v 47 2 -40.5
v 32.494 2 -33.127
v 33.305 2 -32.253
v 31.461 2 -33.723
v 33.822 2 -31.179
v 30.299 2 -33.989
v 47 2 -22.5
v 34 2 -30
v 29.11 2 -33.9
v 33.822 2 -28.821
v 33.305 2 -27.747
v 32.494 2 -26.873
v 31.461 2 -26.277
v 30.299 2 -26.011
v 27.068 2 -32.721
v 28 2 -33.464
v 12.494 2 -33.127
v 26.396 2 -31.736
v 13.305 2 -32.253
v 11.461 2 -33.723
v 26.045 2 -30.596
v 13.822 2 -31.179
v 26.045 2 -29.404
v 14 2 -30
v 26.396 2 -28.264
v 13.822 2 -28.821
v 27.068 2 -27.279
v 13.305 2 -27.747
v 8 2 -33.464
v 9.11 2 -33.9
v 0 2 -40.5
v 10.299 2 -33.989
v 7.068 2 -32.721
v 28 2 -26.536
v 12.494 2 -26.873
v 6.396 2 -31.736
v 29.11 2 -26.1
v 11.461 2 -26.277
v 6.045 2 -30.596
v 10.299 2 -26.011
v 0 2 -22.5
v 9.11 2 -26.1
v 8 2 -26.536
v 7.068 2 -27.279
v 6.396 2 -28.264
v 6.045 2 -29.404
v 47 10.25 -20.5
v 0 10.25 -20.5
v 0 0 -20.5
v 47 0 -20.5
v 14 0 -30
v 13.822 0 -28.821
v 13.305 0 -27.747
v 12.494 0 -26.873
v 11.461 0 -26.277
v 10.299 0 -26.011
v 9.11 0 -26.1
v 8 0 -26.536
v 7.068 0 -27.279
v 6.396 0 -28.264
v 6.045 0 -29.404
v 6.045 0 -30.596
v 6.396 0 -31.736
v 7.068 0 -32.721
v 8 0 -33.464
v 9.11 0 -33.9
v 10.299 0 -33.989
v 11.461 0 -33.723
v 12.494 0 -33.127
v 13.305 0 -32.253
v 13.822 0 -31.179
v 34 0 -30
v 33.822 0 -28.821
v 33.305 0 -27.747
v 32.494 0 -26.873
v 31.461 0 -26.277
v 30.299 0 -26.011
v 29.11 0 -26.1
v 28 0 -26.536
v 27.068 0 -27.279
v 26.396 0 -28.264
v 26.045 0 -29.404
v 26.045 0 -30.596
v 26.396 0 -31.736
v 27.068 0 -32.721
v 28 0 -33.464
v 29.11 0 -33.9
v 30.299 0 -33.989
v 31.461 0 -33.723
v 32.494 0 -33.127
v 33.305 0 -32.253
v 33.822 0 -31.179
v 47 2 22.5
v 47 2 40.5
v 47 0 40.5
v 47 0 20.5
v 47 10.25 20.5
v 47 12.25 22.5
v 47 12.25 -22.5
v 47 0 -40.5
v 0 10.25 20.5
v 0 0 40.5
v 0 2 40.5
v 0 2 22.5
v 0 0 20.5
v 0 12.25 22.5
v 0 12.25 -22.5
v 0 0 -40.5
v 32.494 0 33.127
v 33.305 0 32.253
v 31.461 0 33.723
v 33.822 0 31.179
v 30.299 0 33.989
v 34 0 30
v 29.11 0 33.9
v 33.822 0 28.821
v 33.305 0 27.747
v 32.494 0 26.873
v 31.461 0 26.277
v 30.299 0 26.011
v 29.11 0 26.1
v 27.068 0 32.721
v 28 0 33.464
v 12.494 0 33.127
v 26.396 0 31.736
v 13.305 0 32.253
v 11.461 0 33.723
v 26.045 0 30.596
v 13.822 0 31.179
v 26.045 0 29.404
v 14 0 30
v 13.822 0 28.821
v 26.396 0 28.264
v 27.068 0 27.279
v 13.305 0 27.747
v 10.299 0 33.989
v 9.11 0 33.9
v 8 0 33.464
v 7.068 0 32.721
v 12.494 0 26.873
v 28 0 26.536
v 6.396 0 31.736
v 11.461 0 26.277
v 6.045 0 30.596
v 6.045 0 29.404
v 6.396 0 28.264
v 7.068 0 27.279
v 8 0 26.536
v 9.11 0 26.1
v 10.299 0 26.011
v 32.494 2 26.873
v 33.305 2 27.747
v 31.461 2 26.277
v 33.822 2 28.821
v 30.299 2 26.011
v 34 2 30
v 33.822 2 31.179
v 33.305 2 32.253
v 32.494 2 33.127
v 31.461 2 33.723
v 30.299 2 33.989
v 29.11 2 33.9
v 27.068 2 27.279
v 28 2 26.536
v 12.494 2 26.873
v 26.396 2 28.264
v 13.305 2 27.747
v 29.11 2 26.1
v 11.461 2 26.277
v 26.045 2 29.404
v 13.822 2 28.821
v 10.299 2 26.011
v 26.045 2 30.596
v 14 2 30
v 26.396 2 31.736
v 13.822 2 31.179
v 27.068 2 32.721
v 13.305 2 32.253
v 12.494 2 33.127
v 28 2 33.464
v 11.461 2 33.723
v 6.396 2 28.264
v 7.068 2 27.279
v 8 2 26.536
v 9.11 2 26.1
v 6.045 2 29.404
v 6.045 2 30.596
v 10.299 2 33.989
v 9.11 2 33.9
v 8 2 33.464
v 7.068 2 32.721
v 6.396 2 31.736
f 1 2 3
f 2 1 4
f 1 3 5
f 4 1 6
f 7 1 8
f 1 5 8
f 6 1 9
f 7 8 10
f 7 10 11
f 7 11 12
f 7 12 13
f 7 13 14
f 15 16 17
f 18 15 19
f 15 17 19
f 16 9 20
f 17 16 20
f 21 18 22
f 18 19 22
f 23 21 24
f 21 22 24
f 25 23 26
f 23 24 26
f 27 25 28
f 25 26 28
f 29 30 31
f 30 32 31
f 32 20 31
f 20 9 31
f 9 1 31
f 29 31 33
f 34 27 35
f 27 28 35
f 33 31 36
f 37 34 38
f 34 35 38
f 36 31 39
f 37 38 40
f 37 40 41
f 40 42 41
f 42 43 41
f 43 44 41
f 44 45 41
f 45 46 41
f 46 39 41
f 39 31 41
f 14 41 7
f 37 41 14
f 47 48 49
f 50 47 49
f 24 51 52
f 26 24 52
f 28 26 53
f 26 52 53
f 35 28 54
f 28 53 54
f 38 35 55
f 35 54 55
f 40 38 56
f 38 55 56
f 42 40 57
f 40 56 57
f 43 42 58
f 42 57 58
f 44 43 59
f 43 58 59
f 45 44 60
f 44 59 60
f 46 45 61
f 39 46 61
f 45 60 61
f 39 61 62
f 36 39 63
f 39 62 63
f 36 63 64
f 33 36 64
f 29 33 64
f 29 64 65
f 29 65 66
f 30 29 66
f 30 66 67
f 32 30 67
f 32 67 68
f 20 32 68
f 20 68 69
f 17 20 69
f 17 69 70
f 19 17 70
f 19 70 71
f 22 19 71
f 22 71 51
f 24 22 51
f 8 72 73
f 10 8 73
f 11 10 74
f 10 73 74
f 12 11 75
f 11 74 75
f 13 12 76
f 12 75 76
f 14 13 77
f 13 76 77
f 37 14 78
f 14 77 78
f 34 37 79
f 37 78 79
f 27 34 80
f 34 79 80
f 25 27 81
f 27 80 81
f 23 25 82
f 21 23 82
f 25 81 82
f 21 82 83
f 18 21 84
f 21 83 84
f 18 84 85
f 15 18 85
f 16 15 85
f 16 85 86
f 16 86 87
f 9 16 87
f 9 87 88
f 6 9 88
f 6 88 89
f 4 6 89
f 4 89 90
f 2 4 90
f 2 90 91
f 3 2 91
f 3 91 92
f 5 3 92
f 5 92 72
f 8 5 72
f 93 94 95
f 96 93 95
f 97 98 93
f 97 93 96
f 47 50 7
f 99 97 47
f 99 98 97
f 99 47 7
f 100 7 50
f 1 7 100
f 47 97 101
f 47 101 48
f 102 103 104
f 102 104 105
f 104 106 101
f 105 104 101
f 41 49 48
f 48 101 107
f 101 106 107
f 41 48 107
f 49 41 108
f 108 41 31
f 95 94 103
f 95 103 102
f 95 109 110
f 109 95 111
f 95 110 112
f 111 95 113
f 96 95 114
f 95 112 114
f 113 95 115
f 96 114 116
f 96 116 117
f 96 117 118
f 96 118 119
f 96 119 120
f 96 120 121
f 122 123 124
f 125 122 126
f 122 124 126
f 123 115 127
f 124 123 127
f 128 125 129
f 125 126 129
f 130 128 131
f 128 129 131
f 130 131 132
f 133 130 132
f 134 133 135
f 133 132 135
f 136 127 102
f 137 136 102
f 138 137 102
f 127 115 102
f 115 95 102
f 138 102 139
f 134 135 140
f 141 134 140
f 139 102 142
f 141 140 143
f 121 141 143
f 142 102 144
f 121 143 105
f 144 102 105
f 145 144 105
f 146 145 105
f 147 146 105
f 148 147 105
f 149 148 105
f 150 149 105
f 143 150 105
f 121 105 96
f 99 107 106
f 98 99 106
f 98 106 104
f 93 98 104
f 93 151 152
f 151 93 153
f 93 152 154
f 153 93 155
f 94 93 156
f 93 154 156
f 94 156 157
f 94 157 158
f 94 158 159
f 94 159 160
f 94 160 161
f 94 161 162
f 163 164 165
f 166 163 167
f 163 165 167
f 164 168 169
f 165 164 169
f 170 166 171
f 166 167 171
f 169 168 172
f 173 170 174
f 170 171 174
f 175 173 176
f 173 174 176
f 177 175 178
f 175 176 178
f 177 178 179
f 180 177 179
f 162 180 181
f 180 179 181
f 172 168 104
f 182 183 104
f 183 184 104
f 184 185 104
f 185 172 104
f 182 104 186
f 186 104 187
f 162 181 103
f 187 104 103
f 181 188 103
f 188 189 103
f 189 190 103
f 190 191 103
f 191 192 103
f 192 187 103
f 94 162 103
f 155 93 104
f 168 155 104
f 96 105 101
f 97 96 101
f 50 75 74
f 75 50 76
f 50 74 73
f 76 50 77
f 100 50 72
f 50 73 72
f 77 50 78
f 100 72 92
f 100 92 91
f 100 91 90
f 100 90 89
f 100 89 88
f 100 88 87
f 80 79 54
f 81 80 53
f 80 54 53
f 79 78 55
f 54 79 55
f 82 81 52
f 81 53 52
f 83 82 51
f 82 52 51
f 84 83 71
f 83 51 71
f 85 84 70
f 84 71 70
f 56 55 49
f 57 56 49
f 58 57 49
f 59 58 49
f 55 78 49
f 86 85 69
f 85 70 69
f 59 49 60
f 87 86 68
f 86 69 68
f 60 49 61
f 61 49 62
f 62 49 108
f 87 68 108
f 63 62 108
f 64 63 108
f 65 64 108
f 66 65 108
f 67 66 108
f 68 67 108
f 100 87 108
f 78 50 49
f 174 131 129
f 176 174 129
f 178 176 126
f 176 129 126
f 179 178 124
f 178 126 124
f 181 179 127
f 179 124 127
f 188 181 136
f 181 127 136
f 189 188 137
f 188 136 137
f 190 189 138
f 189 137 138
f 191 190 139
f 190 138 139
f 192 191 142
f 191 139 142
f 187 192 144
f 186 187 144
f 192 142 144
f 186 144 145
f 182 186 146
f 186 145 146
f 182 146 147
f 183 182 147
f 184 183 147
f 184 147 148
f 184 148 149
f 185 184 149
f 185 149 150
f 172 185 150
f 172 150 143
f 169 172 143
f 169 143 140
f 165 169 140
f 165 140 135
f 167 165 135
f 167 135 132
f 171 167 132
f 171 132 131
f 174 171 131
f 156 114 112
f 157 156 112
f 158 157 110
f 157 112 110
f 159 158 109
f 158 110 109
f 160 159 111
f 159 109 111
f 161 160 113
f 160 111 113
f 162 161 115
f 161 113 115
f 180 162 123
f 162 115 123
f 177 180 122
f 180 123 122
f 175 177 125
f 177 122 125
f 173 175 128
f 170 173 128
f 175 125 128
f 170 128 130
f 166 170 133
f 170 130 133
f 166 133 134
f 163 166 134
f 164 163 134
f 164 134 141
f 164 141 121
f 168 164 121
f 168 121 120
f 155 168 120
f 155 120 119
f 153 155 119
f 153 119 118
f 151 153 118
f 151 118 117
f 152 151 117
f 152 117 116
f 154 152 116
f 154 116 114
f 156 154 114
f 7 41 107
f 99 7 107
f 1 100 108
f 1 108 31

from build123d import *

# Parameters (mm, degrees)
EXTRUDE_1_DEPTH     = 47
SKETCH_2_R          = 4
CUT_EXTRUDE_1_DEPTH = 10


with BuildPart() as part:
    # Эскиз1 → Вытянуть-Тонкостенный1 (new body)
    with BuildSketch(Plane(origin=(0, 0, 0), x_dir=(0, 0, -1), z_dir=(1, 0, 0))):
        Polygon((-40.5, 0), (-20.5, 0), (-20.5, 10.25), (20.5, 10.25), (20.5, 0), (40.5, 0), (40.5, 2), (22.5, 2), (22.5, 12.25), (-22.5, 12.25), (-22.5, 2), (-40.5, 2), align=None)
    extrude(amount=EXTRUDE_1_DEPTH)

    # Эскиз2 → Вырез-Вытянуть1 (cut)
    with BuildSketch(Plane.XZ):
        with Locations((10, 30)):
            Circle(SKETCH_2_R)
        with Locations((30, 30)):
            Circle(SKETCH_2_R)
        with Locations((30, -30)):
            Circle(SKETCH_2_R)
        with Locations((10, -30)):
            Circle(SKETCH_2_R)
    extrude(amount=-CUT_EXTRUDE_1_DEPTH, mode=Mode.SUBTRACT)


solid = part.part
